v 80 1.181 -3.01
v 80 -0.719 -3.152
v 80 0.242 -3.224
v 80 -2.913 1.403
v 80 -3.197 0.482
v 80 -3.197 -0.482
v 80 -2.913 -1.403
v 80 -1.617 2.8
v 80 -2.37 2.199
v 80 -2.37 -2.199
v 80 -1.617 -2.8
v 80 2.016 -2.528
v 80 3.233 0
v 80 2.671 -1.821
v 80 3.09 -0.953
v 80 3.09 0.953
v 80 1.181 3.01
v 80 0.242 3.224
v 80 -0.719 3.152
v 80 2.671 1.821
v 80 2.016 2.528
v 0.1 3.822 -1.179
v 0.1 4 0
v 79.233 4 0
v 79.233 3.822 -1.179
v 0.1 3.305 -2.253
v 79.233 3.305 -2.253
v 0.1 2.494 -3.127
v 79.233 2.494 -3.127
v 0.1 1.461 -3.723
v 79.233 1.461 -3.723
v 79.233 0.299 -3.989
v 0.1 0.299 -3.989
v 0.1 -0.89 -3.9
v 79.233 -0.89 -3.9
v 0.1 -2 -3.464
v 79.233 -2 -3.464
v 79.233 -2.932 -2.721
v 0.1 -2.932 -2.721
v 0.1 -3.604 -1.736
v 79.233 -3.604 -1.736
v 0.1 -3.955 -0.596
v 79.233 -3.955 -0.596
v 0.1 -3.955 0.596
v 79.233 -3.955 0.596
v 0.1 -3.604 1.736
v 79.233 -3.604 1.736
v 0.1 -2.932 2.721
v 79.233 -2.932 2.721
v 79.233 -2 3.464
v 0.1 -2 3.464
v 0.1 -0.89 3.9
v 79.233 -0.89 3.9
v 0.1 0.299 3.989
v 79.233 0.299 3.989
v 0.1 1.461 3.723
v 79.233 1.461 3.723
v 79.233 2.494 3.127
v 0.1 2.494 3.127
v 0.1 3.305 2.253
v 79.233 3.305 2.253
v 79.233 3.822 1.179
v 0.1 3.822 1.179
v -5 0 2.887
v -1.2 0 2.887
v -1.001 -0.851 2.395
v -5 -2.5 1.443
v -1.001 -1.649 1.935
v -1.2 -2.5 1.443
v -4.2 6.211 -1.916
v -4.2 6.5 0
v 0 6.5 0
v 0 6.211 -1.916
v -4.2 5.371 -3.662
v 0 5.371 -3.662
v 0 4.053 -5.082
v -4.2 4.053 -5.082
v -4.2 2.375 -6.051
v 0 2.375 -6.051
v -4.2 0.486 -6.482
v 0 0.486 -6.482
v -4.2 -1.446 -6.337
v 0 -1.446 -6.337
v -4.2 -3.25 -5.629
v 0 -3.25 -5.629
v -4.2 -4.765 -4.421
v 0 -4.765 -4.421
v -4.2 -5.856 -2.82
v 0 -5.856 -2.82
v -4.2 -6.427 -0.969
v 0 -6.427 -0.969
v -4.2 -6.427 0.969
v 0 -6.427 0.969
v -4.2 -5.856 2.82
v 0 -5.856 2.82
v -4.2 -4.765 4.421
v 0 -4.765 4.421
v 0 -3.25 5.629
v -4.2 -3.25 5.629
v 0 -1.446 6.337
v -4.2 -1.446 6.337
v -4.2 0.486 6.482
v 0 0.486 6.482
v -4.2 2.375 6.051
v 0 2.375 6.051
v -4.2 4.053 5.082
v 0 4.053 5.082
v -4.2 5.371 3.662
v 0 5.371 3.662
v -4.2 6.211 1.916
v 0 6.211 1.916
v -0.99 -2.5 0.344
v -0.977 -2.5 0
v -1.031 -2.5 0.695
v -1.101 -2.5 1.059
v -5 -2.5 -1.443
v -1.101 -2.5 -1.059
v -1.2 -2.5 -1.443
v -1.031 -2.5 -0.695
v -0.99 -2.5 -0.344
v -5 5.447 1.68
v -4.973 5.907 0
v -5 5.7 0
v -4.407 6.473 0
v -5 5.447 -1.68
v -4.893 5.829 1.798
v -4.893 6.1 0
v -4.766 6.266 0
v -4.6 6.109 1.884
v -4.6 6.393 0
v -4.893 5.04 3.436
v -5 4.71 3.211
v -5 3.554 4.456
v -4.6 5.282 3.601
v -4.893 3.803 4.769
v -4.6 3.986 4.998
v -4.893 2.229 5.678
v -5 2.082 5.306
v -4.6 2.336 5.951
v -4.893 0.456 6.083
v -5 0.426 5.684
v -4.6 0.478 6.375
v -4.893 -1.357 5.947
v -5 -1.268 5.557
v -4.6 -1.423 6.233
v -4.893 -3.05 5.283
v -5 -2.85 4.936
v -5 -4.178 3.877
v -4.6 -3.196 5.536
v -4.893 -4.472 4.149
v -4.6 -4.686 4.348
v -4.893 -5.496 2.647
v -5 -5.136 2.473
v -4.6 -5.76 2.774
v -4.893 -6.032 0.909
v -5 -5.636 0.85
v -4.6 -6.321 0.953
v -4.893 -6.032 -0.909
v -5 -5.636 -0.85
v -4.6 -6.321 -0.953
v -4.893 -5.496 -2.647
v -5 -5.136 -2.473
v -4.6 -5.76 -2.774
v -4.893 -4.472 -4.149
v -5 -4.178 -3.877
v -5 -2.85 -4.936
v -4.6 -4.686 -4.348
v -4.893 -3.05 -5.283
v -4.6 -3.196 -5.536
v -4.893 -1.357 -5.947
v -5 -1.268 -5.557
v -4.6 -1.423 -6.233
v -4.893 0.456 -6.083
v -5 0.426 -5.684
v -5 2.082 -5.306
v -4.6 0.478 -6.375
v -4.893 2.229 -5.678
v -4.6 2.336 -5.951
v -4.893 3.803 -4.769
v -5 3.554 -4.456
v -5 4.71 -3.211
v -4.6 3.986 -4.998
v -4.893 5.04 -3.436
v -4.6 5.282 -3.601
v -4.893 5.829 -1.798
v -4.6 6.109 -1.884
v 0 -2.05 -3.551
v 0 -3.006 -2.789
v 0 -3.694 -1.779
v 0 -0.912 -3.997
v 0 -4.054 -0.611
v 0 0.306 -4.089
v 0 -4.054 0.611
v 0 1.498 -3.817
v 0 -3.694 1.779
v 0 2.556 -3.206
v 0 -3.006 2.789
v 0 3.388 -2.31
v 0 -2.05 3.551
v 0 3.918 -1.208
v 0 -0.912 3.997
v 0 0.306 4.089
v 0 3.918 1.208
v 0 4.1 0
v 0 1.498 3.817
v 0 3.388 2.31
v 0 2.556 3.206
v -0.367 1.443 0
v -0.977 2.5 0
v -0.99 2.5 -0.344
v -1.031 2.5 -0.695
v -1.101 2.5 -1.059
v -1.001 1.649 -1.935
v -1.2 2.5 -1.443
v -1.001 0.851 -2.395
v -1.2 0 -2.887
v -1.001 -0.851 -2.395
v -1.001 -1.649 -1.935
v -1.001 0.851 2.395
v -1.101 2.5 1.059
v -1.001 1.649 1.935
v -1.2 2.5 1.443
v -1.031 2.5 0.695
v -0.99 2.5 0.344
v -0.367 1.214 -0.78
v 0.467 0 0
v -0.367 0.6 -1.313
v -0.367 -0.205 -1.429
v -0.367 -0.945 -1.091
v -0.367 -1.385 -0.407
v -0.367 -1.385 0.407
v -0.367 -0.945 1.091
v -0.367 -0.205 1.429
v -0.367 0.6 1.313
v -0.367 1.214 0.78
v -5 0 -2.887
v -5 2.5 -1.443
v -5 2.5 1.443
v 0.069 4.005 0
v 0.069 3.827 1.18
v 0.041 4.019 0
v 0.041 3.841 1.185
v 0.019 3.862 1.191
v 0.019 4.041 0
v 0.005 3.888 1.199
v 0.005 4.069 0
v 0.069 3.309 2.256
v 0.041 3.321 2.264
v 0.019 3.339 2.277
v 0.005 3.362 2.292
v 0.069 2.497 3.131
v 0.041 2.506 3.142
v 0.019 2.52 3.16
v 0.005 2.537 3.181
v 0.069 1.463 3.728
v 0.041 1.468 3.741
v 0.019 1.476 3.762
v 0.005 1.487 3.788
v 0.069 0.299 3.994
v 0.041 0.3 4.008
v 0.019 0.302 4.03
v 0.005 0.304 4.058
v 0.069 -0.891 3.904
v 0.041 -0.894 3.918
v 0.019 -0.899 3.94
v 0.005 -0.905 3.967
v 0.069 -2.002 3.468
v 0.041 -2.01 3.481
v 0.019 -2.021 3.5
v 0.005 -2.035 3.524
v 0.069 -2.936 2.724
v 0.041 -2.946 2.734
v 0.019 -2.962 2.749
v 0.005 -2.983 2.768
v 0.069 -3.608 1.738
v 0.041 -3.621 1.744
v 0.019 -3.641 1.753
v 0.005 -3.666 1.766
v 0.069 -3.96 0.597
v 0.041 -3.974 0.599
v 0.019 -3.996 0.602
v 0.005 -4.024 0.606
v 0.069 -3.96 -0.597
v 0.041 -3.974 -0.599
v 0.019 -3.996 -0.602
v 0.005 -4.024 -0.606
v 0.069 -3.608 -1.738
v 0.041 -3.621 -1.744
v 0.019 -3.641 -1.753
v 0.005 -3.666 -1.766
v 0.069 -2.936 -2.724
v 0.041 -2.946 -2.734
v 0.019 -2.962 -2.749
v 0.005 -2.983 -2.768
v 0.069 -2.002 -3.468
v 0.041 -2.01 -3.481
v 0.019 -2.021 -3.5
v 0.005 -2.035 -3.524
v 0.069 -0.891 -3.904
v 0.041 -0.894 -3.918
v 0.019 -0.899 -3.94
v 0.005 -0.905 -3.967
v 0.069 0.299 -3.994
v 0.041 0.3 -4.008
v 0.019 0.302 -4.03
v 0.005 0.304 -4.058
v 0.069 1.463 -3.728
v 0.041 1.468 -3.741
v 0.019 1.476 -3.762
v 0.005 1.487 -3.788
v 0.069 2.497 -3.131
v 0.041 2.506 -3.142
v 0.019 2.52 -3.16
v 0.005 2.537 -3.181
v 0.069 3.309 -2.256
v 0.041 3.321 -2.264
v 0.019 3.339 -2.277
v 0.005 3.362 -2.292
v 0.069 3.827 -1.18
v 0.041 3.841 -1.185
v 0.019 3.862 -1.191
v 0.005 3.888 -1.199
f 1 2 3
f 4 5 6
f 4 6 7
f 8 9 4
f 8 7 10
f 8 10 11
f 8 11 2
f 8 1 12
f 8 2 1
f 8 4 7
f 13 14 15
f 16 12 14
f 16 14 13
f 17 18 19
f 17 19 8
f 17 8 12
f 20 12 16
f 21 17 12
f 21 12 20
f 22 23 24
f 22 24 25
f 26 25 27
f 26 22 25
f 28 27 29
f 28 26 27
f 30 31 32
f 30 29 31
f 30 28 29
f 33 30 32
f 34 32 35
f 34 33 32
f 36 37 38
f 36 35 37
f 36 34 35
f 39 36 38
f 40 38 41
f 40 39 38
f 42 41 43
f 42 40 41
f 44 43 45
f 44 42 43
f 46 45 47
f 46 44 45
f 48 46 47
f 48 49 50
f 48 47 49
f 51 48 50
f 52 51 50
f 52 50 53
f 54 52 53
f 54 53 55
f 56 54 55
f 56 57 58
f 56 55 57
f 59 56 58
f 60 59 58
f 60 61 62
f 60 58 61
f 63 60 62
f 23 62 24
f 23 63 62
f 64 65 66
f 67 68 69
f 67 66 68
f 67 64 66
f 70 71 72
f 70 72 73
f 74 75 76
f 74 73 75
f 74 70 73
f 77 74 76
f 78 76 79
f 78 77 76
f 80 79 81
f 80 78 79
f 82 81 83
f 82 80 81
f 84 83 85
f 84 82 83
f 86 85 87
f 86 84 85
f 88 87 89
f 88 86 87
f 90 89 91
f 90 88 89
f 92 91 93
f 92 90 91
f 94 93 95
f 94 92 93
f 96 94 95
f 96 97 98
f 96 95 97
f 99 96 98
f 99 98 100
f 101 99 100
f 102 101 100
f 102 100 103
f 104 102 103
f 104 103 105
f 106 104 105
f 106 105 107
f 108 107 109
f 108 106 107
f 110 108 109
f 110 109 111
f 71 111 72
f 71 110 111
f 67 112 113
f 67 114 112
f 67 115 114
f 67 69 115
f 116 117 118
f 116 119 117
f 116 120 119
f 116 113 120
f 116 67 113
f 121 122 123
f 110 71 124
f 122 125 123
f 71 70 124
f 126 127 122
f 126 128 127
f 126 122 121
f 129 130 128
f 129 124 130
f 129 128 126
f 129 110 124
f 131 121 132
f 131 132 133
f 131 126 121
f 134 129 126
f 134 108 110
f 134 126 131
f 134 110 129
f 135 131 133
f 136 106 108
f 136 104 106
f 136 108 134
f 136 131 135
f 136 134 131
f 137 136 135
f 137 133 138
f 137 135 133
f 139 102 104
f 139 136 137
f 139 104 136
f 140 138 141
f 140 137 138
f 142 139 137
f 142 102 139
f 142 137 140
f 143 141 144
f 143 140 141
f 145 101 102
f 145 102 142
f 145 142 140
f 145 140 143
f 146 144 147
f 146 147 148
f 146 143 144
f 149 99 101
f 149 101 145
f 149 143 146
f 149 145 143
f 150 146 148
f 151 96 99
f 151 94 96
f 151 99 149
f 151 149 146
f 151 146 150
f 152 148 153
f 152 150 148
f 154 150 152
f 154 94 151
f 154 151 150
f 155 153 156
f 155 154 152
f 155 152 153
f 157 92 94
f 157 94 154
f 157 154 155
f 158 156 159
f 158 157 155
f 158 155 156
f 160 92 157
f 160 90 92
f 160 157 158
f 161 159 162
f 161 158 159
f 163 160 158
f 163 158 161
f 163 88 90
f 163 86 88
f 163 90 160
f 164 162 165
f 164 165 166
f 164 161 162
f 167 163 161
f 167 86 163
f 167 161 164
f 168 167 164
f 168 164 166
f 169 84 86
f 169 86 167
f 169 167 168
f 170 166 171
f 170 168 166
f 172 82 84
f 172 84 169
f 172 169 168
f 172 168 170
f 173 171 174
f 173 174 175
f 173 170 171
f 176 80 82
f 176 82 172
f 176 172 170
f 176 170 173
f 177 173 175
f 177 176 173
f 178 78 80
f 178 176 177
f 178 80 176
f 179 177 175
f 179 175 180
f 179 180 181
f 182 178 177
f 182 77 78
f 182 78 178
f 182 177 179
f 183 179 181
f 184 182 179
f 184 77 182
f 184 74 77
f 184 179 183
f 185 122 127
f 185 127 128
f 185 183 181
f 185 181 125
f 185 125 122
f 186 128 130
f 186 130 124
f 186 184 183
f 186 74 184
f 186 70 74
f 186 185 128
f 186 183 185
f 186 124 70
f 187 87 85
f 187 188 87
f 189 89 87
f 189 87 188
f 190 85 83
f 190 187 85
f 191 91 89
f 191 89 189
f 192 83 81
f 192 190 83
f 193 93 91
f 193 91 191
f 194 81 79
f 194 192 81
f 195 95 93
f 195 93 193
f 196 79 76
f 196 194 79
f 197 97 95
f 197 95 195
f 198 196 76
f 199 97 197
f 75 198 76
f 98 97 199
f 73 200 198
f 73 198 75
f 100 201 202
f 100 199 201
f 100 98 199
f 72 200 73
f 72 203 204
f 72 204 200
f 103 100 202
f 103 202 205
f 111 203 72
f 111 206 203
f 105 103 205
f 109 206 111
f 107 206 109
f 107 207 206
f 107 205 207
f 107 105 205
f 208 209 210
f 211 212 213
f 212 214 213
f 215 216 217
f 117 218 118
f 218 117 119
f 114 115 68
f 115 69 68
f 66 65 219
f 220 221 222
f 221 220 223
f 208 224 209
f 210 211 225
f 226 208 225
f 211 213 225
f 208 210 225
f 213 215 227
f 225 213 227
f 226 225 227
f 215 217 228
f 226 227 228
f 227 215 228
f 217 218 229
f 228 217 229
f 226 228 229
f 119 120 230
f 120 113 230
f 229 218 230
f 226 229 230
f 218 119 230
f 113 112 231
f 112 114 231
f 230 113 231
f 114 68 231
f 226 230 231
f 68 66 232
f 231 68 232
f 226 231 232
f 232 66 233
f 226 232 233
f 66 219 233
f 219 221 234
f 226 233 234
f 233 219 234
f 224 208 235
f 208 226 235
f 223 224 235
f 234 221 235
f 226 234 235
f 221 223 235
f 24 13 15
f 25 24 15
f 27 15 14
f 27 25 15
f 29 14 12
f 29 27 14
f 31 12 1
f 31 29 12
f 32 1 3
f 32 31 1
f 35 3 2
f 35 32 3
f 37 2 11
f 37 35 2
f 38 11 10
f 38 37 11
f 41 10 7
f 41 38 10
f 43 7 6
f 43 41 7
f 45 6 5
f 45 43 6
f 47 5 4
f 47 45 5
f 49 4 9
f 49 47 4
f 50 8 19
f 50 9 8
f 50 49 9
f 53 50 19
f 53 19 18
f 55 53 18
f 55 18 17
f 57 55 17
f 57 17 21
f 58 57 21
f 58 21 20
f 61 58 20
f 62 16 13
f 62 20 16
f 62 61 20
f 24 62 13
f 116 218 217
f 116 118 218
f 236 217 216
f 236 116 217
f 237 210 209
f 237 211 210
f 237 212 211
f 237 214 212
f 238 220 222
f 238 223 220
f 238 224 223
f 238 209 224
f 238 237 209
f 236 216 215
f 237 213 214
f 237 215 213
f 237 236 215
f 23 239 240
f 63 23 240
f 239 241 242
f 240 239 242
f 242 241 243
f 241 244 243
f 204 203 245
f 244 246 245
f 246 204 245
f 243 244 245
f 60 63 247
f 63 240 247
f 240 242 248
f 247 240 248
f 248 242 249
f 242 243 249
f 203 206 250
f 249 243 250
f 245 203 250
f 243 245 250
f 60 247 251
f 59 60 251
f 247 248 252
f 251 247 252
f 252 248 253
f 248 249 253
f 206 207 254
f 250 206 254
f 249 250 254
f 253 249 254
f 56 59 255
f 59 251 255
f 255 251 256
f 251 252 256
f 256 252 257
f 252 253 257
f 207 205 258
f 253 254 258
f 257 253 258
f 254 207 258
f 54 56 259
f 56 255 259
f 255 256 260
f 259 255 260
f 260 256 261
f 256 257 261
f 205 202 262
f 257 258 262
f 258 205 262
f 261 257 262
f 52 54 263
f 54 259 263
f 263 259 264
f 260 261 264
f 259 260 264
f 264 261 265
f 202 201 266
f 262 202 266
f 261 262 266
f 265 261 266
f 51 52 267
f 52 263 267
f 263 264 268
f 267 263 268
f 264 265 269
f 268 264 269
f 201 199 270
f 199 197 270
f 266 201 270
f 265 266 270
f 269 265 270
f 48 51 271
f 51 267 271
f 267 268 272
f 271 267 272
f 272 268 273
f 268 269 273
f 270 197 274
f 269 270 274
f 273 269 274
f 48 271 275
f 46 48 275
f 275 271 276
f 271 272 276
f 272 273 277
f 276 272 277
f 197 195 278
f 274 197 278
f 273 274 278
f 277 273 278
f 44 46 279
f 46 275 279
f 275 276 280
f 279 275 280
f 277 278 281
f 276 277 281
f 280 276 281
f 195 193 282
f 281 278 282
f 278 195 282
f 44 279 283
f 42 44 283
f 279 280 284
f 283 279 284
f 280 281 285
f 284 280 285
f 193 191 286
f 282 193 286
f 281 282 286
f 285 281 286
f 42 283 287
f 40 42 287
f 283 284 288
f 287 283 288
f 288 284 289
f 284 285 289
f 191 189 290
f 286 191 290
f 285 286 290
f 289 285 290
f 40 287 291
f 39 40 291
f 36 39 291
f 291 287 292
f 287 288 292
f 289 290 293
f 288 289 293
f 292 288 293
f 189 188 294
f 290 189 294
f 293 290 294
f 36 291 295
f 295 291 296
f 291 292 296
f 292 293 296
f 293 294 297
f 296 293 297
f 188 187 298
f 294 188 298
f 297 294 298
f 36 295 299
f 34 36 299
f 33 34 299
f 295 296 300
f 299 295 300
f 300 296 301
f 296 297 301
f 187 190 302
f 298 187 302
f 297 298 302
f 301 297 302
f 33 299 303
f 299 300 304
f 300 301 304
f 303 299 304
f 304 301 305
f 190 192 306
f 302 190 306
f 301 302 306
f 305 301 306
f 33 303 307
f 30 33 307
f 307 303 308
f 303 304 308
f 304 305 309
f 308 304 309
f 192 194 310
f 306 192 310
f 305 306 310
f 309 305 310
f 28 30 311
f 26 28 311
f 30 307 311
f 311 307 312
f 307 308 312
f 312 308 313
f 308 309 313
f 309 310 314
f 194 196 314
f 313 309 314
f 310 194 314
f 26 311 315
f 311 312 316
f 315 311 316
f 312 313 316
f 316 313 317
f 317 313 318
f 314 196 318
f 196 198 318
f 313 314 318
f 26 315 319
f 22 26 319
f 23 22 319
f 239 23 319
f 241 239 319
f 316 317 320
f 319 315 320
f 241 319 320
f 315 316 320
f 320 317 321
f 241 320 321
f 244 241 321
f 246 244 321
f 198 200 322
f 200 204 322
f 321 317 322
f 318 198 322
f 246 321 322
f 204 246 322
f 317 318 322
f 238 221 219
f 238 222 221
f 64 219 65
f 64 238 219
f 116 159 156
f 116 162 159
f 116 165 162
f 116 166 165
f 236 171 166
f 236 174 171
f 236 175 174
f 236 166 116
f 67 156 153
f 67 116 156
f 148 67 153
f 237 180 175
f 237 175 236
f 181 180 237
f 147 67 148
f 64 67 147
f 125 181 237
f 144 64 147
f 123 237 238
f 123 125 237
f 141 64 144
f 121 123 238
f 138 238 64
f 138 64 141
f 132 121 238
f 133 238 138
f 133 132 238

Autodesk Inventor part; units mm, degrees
ref_plane "YZ Plane" through (0, 0, 0) normal (1, 0, 0) x (0, 1, 0)
ref_plane "XZ Plane" through (0, 0, 0) normal (0, 1, 0) x (-1, 0, 0)
sketch "Sketch1" plane through (0, 0, 0) normal (0, 0, 1) x (1, 0, 0)
  line L0 (0.4667, 0) -> (80, 0)
  line L1 (80, 0) -> (80, 4)
  line L2 (80, 4) -> (58, 4)
  line L3 (58, 4) -> (57.2331, 4)
  line L4 (57.2331, 4) -> (0, 4)
  line L5 (0, 4) -> (0, 6.5)
  line L6 (0, 6.5) -> (-5, 6.5)
  line L7 (-5, 6.5) -> (-5, 2.8868)
  line L8 (-5, 2.8868) -> (-1.2, 2.8868)
  line L9 (-1.2, 2.8868) -> (0.4667, 0)
  line L10 (-22, 0) -> (97, 0) projected
  line L11 (0, -1.3) -> (0, 7.8) projected
  line L12 (58, 4) -> (0, 4) construction
  dimension "d1" = 22
  dimension "d2" = 0.7669
  dimension "d3" = 5
  dimension "d4" = 3.8
  dimension "d5" = 60
  dimension "d6" = 8
  dimension "d7" = 8
  dimension "d8" = 5.7735
  dimension "d9" = 13
  dimension "d26" = 80
revolve "Body" add sketch "Sketch1" angle 360 about axis through (0.4667, 0, 0) along (1, 0, 0) contours L9 L11 L4 L3 L2 L1 L0 | L9 L8 L7 L6 L5 L11
sketch "Sketch2" plane through (-5, 0, 0) normal (-1, 0, 0) x (0, 0, 1)
  circle A0 centre (0, 0) radius 2.8868 projected
  line L0 (0, -9.1) -> (0, 9.1) projected
  line L1 (-9.1, 0) -> (9.1, 0) projected
  line L2 (2.8868, 0) -> (1.4434, -2.5)
  line L3 (1.4434, -2.5) -> (-1.4434, -2.5)
  line L4 (-1.4434, -2.5) -> (-2.8868, 0)
  line L5 (-2.8868, 0) -> (-1.4434, 2.5)
  line L6 (-1.4434, 2.5) -> (1.4434, 2.5)
  line L7 (1.4434, 2.5) -> (2.8868, 0)
extrude "Slot" add sketch "Sketch2" against normal up to next contours L7 A0 | A0 L2 | L6 L0 A0 | A0 L0 L3 | L0 L6 A0 | A0 L3 L0 | L4 A0 | A0 L5
fillet "Fillet1" radius 0.8 1 edges at (-5, -6.5, 0)
thread "Thread" size "M8x1.25" class "6g" standard "ISO Metric profile" length 22
chamfer "Chamfer1" distance 0.7668 distance2 0.7668 1 edges at (80, -4, 0) measured on face at (80, -0.998, -1.3105)
ref_plane "Work Plane1" through (29, 0, 0) normal (0, -1, 0) x (1, 0, 0)
fillet "Fillet2" radius 0.1 1 edges at (0, -4, 0)
equation "\"d1\" = GEL"
equation "\"d3\" = KOH"
equation "\"d4\" = INTI"
equation "\"d6\" = GD"
equation "\"d7\" = BDM"
equation "\"d8\" = 1.1547 * SW"
equation "\"d9\" = KOD"
equation "\"d26\" = NLG"
equation "\"d30\" = R"
equation "\"d17\" = RR"
equation "\"d13\" = GEL"
equation "\"d15\" = -0.5 * SPD + 0.5 * GD"
equation "\"d16\" = GUL"
equation "\"GD\" = NND"
equation "\"NLG\" = 80"
equation "\"GEL\" = 22"
equation "\"KOD\" = 13"
equation "\"KOH\" = 5"
equation "\"INTI\" = 3.8"
equation "\"GAL\" = 0.61345 * PTC"
equation "\"GUL\" = 0.61345 * PTC"
equation "\"BDM\" = NND"
equation "\"SW\" = 5"
equation "\"RR\" = 0.8"
equation "\"SPD\" = NND - 1.2269 * PTC"
equation "\"R\" = 0.1"
equation "\"TOA\" = 30deg"
equation "\"GD1\" = THREADDIA - 1.2269 * PTC"
equation "\"THREADDIA\" = 8"
equation "\"FAWI\" = 45deg"
equation "\"ANG\" = 120deg"
equation "\"PTC\" = 1.25"
equation "\"NND\" = 8"
equation "\"E0\" = 1.155 * SW"
properties part number "DIN 7984 - M8 x 80" material "Steel, Mild"
